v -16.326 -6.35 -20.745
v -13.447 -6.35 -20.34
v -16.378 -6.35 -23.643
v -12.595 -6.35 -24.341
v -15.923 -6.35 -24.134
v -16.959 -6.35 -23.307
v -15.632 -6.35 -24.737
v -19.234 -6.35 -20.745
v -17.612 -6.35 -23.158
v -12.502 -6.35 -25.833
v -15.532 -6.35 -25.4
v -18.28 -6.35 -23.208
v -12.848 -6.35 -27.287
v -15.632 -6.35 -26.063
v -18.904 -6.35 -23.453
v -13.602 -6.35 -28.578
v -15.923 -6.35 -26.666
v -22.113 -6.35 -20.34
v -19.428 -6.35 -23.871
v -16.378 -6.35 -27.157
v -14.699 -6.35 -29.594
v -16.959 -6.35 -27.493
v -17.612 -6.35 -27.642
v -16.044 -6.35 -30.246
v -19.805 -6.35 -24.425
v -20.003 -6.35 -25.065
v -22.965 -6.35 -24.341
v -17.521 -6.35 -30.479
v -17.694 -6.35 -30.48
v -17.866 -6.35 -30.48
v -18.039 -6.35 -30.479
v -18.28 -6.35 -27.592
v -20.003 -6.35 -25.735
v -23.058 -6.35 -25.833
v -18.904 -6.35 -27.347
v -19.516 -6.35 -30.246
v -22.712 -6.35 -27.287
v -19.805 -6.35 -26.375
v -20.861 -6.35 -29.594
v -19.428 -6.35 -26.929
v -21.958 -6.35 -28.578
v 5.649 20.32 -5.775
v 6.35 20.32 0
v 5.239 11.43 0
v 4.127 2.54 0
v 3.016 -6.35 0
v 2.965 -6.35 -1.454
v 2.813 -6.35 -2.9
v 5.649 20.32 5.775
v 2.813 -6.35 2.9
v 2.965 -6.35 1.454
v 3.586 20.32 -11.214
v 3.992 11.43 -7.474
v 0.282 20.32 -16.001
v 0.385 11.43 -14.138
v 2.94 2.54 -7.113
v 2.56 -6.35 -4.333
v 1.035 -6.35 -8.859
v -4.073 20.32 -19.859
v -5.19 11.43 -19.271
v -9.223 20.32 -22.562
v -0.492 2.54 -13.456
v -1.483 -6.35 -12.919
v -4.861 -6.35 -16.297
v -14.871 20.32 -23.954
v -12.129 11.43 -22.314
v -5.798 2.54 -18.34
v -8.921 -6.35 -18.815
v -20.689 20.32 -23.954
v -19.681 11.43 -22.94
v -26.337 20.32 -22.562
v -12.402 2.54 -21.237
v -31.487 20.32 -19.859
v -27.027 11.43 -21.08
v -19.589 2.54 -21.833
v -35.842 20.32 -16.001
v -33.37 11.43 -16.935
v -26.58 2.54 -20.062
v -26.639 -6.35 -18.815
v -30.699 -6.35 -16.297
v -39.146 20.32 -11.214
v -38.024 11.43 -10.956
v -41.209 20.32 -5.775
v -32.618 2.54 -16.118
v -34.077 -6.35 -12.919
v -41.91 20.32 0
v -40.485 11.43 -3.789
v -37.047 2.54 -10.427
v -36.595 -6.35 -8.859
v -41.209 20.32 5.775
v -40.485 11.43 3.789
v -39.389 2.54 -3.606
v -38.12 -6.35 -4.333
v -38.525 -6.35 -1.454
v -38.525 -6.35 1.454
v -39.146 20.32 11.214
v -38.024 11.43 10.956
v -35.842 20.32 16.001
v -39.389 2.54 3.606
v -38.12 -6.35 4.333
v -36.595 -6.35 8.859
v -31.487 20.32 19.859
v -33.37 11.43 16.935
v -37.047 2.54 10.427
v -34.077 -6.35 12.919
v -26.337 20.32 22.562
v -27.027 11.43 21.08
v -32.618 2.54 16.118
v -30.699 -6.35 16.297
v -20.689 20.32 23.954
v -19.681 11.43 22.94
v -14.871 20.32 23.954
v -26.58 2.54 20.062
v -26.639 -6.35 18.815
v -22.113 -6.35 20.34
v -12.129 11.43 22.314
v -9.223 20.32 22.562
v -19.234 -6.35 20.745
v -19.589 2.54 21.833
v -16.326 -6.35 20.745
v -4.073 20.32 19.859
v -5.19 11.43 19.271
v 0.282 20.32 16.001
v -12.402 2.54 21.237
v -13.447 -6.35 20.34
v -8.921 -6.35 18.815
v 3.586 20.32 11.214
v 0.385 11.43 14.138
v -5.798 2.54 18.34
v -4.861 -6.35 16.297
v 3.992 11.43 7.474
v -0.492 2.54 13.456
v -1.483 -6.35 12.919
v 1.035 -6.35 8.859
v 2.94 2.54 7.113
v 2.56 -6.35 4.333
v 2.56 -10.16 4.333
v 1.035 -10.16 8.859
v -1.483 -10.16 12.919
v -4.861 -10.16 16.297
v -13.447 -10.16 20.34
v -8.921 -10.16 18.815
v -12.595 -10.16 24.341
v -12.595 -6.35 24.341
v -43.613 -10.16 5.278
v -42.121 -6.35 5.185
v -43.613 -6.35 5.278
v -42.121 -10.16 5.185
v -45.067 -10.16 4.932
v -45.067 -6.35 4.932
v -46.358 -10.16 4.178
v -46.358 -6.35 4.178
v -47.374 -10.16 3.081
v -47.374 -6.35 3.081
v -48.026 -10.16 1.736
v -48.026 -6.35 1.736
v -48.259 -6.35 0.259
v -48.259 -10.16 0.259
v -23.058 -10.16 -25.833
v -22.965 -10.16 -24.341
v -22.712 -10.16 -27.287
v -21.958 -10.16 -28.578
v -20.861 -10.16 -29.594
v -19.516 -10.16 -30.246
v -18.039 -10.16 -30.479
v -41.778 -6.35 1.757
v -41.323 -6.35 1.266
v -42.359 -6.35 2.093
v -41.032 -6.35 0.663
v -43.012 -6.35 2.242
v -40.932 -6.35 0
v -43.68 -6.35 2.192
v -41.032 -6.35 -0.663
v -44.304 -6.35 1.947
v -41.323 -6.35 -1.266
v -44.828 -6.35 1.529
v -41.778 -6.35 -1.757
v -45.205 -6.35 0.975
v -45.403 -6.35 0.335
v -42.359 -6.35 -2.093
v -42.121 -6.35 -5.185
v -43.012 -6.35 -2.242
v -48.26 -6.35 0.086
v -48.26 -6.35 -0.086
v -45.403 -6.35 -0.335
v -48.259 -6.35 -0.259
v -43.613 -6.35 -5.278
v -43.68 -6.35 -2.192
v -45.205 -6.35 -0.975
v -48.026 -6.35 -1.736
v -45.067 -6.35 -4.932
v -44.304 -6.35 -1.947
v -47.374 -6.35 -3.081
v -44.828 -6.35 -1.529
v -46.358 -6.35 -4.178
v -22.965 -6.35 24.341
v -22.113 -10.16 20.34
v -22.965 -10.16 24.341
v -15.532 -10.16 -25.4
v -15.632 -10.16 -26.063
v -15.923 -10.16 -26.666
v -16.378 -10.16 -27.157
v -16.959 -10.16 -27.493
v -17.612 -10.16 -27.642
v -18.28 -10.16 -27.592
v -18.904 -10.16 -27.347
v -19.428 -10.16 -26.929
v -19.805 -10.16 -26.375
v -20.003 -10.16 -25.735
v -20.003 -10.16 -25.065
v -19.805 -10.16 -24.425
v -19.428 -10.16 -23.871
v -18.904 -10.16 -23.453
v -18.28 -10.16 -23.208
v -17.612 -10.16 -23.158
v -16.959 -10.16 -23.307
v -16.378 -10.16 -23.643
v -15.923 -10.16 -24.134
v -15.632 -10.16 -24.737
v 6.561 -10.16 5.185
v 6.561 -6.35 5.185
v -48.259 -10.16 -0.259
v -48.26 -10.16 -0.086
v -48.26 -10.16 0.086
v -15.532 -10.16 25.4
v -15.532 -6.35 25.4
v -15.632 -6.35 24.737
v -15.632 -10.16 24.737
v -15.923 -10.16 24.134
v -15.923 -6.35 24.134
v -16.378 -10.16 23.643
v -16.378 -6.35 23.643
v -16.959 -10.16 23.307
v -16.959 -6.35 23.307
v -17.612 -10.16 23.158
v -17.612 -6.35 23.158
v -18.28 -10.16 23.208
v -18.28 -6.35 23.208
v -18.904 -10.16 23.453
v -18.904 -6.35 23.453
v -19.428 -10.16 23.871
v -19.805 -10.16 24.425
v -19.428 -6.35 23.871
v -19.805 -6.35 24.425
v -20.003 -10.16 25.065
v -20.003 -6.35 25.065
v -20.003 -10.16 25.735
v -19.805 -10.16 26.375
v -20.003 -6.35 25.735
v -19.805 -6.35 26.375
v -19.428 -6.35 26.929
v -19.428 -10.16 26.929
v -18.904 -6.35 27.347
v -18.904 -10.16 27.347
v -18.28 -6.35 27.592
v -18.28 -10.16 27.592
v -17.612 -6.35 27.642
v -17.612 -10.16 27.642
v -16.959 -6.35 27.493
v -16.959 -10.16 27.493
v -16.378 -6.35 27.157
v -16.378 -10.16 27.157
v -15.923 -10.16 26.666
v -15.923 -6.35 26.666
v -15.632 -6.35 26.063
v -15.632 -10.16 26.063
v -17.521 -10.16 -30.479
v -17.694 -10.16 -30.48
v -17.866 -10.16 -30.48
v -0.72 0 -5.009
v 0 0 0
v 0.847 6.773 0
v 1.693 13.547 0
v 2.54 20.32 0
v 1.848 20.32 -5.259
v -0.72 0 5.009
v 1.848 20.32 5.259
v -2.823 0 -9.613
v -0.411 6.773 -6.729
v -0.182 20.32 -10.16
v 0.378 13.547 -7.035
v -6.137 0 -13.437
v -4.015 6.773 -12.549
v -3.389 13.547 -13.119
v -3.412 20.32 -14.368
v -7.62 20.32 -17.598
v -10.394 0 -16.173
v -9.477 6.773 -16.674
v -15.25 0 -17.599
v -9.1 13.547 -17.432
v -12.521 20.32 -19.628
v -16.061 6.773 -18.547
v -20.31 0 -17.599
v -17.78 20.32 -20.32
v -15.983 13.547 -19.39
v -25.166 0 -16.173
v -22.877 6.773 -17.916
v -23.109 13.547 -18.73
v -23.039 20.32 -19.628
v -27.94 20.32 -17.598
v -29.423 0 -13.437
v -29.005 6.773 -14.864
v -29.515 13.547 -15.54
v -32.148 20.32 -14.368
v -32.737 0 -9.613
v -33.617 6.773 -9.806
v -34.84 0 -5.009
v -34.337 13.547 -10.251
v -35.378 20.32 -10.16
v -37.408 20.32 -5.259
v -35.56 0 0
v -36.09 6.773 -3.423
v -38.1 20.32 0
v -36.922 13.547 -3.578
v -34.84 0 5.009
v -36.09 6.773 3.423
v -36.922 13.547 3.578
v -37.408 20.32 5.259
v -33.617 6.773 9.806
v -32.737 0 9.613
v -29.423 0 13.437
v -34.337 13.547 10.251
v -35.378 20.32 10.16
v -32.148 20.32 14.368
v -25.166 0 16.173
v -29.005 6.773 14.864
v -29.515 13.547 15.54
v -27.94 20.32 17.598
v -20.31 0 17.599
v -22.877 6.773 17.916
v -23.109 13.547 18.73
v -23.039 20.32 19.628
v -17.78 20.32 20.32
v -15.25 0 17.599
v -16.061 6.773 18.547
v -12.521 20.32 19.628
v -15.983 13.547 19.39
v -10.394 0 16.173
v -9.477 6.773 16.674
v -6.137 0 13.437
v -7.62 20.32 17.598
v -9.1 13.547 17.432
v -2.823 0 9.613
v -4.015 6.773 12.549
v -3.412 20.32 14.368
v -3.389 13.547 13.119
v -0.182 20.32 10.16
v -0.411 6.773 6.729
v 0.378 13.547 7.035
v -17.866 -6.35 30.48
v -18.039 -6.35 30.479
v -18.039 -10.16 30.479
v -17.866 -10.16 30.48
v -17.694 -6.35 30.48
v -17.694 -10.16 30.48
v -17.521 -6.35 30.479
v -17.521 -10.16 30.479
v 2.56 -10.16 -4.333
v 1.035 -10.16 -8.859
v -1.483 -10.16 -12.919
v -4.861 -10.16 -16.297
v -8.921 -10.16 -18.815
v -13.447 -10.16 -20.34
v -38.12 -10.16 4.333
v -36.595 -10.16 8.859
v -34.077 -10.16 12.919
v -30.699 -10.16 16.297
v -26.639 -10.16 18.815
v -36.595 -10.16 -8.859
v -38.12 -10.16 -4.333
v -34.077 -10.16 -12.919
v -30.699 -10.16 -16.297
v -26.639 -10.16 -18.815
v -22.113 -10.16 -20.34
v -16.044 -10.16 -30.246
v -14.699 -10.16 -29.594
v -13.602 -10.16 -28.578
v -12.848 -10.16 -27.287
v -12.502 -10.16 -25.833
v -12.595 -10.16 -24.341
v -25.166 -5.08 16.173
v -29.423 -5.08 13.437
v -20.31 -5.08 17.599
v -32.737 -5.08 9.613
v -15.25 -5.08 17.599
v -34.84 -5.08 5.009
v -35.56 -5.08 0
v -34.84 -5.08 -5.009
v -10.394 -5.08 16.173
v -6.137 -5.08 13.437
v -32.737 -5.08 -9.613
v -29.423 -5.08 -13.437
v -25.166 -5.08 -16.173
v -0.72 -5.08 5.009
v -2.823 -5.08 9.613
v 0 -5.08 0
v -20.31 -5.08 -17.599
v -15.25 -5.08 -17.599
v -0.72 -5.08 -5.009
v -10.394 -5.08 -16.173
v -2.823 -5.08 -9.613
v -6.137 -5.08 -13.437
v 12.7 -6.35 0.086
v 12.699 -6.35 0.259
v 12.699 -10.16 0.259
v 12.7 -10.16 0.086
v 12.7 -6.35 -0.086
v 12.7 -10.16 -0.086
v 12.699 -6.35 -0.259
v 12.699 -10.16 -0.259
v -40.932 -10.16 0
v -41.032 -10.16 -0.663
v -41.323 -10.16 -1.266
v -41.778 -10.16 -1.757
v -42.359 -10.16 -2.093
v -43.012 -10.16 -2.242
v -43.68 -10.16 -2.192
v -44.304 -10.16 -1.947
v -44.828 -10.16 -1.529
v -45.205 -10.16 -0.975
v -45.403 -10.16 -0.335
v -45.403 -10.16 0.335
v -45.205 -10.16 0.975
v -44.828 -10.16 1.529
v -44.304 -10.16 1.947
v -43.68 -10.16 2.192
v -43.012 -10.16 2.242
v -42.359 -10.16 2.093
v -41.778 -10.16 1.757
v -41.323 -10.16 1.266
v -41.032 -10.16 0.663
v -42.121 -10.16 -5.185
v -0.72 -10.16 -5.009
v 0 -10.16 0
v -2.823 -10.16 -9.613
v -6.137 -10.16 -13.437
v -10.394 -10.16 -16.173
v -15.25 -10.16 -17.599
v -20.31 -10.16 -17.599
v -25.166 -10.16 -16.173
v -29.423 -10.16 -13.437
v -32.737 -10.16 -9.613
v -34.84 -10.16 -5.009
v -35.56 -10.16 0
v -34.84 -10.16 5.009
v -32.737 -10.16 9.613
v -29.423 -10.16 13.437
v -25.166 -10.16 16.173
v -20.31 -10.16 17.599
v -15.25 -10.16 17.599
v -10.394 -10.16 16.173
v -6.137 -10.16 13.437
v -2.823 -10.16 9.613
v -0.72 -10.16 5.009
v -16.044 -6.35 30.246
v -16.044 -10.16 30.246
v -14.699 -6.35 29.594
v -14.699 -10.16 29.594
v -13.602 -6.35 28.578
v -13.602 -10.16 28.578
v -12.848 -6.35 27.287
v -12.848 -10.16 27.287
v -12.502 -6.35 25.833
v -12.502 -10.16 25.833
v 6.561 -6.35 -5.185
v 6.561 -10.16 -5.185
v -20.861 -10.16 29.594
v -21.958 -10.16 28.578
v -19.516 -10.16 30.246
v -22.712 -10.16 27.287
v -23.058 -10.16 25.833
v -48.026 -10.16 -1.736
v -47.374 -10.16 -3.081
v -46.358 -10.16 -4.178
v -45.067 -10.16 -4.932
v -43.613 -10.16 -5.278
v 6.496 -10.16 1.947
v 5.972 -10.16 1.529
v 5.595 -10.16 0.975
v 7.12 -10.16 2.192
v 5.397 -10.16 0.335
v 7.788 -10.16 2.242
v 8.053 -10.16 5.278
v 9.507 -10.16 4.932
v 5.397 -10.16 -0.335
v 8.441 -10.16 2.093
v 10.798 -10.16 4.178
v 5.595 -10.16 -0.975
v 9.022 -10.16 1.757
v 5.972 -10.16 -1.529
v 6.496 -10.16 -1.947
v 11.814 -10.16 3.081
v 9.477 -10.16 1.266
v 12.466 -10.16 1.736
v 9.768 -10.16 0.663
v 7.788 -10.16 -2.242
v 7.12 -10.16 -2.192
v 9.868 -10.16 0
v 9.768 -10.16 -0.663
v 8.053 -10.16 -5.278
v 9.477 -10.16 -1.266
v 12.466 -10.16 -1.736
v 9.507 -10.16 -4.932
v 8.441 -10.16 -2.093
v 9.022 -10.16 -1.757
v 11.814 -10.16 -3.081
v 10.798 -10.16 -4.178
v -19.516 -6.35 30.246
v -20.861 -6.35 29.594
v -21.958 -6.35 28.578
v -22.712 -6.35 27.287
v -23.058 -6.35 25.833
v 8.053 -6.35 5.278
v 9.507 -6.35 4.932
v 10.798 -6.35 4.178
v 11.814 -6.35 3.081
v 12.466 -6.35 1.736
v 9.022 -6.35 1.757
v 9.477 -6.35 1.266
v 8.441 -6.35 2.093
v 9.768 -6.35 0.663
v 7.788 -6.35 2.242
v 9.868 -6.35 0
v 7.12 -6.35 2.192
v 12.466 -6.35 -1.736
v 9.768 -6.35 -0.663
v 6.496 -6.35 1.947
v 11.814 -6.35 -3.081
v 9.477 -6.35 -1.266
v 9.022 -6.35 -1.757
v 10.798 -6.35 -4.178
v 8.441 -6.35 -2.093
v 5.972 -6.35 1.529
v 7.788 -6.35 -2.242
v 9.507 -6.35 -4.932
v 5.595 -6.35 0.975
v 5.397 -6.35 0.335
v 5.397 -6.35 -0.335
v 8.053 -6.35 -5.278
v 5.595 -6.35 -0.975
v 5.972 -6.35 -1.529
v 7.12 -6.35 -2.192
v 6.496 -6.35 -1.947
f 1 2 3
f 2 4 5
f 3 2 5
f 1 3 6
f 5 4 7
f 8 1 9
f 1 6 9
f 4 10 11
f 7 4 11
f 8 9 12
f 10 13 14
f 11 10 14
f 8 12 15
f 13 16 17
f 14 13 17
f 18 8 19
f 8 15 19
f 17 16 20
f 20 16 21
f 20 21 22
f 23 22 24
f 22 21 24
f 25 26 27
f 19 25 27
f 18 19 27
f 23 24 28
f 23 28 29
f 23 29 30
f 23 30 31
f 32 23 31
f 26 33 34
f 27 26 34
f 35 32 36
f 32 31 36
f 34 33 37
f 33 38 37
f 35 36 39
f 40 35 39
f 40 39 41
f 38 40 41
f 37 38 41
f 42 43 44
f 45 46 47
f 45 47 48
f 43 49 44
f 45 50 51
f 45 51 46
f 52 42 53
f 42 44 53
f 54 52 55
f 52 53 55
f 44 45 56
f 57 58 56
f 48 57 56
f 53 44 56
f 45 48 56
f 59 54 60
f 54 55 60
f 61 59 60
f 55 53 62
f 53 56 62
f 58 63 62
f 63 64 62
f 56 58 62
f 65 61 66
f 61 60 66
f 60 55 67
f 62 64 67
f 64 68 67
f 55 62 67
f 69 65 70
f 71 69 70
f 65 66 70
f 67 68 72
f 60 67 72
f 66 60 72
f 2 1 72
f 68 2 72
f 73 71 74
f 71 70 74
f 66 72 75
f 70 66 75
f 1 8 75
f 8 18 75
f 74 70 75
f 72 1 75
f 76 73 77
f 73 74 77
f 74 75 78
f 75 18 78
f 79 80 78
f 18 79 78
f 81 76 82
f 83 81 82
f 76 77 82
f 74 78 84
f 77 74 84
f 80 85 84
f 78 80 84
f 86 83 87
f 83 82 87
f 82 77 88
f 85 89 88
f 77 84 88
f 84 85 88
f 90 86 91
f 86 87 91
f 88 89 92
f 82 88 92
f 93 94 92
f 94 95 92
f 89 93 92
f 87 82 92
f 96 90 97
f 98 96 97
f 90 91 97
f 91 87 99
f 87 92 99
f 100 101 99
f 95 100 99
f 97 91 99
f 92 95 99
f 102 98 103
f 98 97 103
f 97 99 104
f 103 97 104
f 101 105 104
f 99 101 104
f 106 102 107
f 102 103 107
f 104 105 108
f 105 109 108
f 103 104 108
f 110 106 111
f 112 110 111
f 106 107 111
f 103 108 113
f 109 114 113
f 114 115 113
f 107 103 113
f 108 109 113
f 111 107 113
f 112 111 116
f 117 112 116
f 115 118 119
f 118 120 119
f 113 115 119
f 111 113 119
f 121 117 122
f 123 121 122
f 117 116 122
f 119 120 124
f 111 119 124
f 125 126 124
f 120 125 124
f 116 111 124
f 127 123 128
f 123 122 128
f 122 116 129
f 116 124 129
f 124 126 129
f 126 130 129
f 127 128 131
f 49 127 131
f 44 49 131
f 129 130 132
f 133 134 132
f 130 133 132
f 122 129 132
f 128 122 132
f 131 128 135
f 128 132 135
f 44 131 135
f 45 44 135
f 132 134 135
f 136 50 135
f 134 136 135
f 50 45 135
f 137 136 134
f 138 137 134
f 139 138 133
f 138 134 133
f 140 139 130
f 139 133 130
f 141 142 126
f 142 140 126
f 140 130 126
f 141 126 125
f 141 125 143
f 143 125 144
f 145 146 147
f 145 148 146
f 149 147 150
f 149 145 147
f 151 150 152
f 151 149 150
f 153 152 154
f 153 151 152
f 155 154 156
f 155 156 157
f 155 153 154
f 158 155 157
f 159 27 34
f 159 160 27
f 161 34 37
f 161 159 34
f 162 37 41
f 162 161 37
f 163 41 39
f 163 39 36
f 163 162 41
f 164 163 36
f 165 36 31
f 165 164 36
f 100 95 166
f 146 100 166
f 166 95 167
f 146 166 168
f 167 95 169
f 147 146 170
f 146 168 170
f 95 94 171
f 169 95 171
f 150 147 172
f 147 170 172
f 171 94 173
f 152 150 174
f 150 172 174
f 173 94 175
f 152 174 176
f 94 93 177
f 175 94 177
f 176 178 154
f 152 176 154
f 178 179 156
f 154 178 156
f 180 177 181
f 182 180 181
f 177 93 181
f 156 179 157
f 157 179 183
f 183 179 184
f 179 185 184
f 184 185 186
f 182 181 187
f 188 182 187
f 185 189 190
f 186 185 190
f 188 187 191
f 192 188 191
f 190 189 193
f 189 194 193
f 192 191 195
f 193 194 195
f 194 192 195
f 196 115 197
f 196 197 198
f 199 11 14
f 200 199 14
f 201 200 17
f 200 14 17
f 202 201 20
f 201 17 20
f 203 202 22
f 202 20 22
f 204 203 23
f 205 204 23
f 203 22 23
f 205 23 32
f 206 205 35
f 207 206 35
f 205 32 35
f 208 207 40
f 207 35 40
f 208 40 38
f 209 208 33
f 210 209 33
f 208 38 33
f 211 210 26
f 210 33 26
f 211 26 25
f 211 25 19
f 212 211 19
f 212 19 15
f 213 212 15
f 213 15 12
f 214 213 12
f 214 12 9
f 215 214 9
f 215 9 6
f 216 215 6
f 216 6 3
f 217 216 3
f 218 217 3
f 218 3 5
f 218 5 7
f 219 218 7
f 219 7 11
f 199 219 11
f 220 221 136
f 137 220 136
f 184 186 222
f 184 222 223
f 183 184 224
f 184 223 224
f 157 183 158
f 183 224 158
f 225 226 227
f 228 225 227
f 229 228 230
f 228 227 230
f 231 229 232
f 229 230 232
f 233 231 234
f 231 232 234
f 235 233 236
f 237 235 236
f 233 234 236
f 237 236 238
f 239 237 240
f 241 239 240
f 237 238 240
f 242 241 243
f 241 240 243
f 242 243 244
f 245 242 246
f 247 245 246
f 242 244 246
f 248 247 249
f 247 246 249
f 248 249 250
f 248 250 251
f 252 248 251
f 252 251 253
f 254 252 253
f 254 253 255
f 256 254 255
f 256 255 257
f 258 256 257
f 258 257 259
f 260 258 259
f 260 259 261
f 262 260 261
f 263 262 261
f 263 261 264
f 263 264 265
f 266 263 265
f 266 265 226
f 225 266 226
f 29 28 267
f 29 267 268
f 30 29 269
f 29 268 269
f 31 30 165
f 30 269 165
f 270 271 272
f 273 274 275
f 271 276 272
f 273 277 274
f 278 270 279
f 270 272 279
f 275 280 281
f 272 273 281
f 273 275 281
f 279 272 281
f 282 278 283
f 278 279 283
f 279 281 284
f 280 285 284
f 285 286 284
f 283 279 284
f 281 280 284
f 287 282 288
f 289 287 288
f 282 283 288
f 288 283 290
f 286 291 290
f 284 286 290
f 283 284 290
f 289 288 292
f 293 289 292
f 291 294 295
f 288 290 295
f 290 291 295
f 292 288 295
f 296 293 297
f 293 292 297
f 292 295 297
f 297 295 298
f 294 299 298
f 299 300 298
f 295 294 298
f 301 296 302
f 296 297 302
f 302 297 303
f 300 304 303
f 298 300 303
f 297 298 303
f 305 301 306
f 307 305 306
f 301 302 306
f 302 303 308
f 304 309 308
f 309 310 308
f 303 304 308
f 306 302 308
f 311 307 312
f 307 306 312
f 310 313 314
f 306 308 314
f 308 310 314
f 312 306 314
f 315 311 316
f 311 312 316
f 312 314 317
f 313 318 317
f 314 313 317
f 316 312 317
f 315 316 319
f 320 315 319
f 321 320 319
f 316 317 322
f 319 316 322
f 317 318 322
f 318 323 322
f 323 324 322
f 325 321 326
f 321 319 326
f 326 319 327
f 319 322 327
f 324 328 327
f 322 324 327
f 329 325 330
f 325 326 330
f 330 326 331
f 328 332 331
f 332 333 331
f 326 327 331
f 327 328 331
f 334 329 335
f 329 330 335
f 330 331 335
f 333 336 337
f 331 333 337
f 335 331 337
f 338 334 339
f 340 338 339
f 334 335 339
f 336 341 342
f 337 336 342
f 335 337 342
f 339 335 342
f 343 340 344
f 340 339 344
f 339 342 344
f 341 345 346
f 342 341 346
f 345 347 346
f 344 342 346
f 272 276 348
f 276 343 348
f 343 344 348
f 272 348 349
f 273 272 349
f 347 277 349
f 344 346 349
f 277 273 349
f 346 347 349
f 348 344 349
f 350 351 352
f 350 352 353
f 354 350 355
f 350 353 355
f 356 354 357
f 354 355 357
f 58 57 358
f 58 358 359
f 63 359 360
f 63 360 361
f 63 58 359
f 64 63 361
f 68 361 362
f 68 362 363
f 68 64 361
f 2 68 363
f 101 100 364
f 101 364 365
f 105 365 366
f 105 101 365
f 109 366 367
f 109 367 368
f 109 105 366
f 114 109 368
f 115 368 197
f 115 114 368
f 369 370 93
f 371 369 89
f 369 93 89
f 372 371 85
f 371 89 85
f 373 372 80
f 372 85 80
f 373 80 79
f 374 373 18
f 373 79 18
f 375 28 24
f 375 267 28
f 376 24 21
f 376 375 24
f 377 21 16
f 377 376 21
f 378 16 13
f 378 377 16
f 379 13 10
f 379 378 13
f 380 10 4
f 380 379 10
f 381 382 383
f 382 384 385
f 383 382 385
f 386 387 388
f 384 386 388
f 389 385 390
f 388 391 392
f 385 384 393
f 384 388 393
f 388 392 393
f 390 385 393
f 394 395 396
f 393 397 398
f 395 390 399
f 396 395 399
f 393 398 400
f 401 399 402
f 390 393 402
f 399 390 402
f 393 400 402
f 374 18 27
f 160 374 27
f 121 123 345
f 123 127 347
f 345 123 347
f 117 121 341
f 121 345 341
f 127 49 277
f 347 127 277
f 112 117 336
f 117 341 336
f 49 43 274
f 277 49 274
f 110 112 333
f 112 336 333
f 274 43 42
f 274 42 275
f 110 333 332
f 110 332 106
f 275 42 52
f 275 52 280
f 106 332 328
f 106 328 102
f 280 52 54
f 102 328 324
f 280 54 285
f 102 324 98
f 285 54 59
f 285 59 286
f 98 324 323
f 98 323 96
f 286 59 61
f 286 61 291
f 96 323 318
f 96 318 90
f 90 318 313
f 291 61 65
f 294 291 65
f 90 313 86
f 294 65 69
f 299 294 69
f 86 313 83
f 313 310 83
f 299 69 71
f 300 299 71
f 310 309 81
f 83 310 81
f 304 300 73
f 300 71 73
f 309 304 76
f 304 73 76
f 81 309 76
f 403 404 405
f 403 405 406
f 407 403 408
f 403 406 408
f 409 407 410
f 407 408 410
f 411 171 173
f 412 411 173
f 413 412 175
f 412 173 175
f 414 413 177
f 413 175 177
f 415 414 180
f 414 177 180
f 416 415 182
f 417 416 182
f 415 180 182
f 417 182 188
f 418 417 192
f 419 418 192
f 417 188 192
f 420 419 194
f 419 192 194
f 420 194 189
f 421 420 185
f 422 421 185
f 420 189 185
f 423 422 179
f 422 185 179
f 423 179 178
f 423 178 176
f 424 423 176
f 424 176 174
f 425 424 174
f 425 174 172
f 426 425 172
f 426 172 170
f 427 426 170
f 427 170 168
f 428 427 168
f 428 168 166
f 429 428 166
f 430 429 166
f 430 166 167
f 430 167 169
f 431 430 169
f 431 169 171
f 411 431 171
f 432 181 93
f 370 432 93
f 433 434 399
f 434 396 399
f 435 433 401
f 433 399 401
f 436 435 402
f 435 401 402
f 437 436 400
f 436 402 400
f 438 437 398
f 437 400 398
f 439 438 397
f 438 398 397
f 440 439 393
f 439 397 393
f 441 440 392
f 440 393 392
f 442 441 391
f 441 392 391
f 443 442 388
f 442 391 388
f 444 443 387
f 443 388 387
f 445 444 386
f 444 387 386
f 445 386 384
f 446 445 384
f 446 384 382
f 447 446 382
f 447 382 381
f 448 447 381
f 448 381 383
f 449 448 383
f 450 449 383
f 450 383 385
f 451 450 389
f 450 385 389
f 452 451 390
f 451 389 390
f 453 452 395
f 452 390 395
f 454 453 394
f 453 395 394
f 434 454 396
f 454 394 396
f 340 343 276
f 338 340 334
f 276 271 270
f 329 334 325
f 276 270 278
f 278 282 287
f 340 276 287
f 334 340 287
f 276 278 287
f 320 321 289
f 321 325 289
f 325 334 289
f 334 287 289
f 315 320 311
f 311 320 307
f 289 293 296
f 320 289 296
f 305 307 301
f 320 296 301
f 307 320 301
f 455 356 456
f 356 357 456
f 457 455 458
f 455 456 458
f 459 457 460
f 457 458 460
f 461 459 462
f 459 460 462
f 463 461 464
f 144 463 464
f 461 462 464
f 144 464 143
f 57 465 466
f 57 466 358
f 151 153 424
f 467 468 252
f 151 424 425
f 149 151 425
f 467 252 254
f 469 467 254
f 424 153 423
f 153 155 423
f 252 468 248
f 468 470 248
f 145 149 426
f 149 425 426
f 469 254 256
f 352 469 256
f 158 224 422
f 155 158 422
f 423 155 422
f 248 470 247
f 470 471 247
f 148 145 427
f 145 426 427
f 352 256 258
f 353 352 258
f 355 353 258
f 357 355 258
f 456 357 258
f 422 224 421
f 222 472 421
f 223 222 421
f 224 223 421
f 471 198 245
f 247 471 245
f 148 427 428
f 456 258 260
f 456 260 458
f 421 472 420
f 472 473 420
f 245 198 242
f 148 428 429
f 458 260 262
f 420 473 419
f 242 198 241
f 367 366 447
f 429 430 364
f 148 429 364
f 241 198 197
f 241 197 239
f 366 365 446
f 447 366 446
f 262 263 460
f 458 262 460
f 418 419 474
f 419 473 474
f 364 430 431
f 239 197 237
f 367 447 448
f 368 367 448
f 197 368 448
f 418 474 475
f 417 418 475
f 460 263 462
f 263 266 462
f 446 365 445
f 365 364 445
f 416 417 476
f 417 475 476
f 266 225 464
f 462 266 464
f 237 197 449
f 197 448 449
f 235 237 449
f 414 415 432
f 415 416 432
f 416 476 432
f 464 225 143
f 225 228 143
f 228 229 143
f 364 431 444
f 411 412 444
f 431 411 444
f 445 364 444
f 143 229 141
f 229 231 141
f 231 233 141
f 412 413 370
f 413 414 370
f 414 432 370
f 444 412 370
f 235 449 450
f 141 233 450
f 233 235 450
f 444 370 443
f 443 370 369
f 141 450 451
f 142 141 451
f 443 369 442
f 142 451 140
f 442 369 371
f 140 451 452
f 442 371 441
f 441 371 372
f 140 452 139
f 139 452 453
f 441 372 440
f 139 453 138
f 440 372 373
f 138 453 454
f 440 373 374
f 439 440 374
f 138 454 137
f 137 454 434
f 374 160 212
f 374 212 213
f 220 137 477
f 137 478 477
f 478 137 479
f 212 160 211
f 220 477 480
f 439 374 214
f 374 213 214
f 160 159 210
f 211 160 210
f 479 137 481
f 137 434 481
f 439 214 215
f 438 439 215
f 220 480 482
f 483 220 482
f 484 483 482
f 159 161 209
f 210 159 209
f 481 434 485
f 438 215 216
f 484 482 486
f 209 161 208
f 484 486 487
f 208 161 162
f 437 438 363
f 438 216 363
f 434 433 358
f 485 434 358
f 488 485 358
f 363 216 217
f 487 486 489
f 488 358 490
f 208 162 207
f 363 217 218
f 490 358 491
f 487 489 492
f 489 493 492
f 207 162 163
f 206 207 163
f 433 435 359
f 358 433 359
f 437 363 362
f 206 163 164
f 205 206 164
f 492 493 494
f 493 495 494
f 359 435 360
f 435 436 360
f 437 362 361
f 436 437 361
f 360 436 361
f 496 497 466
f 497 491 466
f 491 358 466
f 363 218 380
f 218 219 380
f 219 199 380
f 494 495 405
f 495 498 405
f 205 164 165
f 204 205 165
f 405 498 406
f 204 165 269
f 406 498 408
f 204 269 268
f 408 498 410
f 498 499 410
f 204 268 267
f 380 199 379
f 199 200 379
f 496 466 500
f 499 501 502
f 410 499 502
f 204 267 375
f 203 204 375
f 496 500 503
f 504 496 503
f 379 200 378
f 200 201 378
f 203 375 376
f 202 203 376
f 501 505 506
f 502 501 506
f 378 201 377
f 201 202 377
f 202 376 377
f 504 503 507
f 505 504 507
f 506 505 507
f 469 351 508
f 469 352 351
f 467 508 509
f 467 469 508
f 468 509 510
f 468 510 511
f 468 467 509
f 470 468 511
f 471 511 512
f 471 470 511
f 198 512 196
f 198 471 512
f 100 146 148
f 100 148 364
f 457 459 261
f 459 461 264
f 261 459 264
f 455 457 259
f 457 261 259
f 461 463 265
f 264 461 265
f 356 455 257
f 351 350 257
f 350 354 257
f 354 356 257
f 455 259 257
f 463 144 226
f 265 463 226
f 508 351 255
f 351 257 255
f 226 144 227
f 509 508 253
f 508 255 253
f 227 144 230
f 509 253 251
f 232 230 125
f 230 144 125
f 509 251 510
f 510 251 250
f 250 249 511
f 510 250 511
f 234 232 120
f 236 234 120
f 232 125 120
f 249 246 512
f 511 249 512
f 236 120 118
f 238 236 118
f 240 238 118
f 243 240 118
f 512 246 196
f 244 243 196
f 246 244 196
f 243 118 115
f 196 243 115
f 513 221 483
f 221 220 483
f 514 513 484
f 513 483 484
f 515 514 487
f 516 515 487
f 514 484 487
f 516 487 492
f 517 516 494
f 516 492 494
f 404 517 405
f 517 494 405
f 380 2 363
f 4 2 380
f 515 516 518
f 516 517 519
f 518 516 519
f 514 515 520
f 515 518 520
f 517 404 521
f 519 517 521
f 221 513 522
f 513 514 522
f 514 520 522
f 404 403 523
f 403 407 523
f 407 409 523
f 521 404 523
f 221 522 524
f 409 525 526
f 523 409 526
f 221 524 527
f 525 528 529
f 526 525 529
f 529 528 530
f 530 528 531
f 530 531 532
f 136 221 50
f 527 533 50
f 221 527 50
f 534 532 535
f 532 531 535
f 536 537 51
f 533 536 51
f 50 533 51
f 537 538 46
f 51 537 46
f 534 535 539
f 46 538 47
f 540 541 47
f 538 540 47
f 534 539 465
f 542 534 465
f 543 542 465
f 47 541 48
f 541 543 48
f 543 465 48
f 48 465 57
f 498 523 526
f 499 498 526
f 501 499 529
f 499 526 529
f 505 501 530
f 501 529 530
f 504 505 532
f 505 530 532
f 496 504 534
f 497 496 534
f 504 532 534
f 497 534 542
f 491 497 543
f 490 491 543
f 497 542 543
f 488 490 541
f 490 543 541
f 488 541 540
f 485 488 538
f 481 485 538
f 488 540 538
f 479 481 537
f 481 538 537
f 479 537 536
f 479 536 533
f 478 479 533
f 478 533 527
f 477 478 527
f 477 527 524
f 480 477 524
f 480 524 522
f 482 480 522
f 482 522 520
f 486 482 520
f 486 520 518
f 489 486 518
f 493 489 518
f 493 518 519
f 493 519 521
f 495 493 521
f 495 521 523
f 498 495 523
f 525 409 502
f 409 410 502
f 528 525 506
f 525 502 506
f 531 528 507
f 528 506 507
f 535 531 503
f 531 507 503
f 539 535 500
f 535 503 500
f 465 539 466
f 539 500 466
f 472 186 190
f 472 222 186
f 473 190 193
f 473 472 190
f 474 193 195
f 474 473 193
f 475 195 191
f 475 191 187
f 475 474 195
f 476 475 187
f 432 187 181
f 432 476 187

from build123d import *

# Parameters (mm, degrees)
SKETCH2_R          = 2.2479
CUT_EXTRUDE1_DEPTH = 4.81
FILLET1_R          = 5.08


with BuildPart() as part:
    # Sketch1 → Revolve1 (revolve)
    with BuildSketch(Plane.XY):
        Polygon((0, 0), (2.54, 20.32), (6.35, 20.32), (3.01625, -6.35), (12.7, -6.35), (12.7, -10.16), (0, -10.16), (0, -5.08), (-17.78, -5.08), (-17.78, 0), align=None)
    revolve(axis=Axis((-17.78, -37.211045685, 0), (0, 1, 0)))

    # Sketch2 → Cut-Extrude1 (cut, through all)
    with BuildSketch(Plane(origin=(0, -6.35, 0), x_dir=(1, 0, 0), z_dir=(0, 1, 0))):
        with Locations((-17.78, -25.4)):
            Circle(SKETCH2_R)
        with Locations((-17.78, 25.4)):
            Circle(SKETCH2_R)
        with Locations((-43.18, 0)):
            Circle(SKETCH2_R)
        with Locations((7.62, 0)):
            Circle(SKETCH2_R)
        with BuildLine():
            Line((12.03120427, -6.35), (2.559936246, -4.332552083))
            ThreePointArc((2.559936246, -4.332552083), (-3.074830602, -14.705169398), (-13.447447917, -20.339936246))
            Line((-13.447447917, -20.339936246), (-11.43, -29.81120427))
            ThreePointArc((-11.43, -29.81120427), (3.772614691, -21.552614691), (12.03120427, -6.35))
        make_face()
        with BuildLine():
            Line((-13.447447917, 20.339936246), (-11.43, 29.81120427))
            ThreePointArc((-11.43, 29.81120427), (3.772614691, 21.552614691), (12.03120427, 6.35))
            Line((12.03120427, 6.35), (2.559936246, 4.332552083))
            ThreePointArc((2.559936246, 4.332552083), (-3.074830602, 14.705169398), (-13.447447917, 20.339936246))
        make_face()
        with BuildLine():
            Line((-22.112552083, -20.339936246), (-24.13, -29.81120427))
            ThreePointArc((-24.13, -29.81120427), (-39.332614691, -21.552614691), (-47.59120427, -6.35))
            Line((-47.59120427, -6.35), (-38.119936246, -4.332552083))
            ThreePointArc((-38.119936246, -4.332552083), (-32.485169398, -14.705169398), (-22.112552083, -20.339936246))
        make_face()
        with BuildLine():
            Line((-47.59120427, 6.35), (-38.119936246, 4.332552083))
            ThreePointArc((-38.119936246, 4.332552083), (-32.485169398, 14.705169398), (-22.112552083, 20.339936246))
            Line((-22.112552083, 20.339936246), (-24.13, 29.81120427))
            ThreePointArc((-24.13, 29.81120427), (-39.332614691, 21.552614691), (-47.59120427, 6.35))
        make_face()
    extrude(amount=-CUT_EXTRUDE1_DEPTH, mode=Mode.SUBTRACT)

    # Fillet1
    fillet1_edges = [part.edges().sort_by_distance(p)[0] for p in [
        (-24.13, -8.255, 29.81120427),
        (-47.59120427, -8.255, 6.35),
        (-11.43, -8.255, -29.81120427),
        (12.03120427, -8.255, -6.35),
        (-47.59120427, -8.255, -6.35),
        (-24.13, -8.255, -29.81120427),
        (12.03120427, -8.255, 6.35),
        (-11.43, -8.255, 29.81120427),
    ]]
    fillet(fillet1_edges, radius=FILLET1_R)


solid = part.part
